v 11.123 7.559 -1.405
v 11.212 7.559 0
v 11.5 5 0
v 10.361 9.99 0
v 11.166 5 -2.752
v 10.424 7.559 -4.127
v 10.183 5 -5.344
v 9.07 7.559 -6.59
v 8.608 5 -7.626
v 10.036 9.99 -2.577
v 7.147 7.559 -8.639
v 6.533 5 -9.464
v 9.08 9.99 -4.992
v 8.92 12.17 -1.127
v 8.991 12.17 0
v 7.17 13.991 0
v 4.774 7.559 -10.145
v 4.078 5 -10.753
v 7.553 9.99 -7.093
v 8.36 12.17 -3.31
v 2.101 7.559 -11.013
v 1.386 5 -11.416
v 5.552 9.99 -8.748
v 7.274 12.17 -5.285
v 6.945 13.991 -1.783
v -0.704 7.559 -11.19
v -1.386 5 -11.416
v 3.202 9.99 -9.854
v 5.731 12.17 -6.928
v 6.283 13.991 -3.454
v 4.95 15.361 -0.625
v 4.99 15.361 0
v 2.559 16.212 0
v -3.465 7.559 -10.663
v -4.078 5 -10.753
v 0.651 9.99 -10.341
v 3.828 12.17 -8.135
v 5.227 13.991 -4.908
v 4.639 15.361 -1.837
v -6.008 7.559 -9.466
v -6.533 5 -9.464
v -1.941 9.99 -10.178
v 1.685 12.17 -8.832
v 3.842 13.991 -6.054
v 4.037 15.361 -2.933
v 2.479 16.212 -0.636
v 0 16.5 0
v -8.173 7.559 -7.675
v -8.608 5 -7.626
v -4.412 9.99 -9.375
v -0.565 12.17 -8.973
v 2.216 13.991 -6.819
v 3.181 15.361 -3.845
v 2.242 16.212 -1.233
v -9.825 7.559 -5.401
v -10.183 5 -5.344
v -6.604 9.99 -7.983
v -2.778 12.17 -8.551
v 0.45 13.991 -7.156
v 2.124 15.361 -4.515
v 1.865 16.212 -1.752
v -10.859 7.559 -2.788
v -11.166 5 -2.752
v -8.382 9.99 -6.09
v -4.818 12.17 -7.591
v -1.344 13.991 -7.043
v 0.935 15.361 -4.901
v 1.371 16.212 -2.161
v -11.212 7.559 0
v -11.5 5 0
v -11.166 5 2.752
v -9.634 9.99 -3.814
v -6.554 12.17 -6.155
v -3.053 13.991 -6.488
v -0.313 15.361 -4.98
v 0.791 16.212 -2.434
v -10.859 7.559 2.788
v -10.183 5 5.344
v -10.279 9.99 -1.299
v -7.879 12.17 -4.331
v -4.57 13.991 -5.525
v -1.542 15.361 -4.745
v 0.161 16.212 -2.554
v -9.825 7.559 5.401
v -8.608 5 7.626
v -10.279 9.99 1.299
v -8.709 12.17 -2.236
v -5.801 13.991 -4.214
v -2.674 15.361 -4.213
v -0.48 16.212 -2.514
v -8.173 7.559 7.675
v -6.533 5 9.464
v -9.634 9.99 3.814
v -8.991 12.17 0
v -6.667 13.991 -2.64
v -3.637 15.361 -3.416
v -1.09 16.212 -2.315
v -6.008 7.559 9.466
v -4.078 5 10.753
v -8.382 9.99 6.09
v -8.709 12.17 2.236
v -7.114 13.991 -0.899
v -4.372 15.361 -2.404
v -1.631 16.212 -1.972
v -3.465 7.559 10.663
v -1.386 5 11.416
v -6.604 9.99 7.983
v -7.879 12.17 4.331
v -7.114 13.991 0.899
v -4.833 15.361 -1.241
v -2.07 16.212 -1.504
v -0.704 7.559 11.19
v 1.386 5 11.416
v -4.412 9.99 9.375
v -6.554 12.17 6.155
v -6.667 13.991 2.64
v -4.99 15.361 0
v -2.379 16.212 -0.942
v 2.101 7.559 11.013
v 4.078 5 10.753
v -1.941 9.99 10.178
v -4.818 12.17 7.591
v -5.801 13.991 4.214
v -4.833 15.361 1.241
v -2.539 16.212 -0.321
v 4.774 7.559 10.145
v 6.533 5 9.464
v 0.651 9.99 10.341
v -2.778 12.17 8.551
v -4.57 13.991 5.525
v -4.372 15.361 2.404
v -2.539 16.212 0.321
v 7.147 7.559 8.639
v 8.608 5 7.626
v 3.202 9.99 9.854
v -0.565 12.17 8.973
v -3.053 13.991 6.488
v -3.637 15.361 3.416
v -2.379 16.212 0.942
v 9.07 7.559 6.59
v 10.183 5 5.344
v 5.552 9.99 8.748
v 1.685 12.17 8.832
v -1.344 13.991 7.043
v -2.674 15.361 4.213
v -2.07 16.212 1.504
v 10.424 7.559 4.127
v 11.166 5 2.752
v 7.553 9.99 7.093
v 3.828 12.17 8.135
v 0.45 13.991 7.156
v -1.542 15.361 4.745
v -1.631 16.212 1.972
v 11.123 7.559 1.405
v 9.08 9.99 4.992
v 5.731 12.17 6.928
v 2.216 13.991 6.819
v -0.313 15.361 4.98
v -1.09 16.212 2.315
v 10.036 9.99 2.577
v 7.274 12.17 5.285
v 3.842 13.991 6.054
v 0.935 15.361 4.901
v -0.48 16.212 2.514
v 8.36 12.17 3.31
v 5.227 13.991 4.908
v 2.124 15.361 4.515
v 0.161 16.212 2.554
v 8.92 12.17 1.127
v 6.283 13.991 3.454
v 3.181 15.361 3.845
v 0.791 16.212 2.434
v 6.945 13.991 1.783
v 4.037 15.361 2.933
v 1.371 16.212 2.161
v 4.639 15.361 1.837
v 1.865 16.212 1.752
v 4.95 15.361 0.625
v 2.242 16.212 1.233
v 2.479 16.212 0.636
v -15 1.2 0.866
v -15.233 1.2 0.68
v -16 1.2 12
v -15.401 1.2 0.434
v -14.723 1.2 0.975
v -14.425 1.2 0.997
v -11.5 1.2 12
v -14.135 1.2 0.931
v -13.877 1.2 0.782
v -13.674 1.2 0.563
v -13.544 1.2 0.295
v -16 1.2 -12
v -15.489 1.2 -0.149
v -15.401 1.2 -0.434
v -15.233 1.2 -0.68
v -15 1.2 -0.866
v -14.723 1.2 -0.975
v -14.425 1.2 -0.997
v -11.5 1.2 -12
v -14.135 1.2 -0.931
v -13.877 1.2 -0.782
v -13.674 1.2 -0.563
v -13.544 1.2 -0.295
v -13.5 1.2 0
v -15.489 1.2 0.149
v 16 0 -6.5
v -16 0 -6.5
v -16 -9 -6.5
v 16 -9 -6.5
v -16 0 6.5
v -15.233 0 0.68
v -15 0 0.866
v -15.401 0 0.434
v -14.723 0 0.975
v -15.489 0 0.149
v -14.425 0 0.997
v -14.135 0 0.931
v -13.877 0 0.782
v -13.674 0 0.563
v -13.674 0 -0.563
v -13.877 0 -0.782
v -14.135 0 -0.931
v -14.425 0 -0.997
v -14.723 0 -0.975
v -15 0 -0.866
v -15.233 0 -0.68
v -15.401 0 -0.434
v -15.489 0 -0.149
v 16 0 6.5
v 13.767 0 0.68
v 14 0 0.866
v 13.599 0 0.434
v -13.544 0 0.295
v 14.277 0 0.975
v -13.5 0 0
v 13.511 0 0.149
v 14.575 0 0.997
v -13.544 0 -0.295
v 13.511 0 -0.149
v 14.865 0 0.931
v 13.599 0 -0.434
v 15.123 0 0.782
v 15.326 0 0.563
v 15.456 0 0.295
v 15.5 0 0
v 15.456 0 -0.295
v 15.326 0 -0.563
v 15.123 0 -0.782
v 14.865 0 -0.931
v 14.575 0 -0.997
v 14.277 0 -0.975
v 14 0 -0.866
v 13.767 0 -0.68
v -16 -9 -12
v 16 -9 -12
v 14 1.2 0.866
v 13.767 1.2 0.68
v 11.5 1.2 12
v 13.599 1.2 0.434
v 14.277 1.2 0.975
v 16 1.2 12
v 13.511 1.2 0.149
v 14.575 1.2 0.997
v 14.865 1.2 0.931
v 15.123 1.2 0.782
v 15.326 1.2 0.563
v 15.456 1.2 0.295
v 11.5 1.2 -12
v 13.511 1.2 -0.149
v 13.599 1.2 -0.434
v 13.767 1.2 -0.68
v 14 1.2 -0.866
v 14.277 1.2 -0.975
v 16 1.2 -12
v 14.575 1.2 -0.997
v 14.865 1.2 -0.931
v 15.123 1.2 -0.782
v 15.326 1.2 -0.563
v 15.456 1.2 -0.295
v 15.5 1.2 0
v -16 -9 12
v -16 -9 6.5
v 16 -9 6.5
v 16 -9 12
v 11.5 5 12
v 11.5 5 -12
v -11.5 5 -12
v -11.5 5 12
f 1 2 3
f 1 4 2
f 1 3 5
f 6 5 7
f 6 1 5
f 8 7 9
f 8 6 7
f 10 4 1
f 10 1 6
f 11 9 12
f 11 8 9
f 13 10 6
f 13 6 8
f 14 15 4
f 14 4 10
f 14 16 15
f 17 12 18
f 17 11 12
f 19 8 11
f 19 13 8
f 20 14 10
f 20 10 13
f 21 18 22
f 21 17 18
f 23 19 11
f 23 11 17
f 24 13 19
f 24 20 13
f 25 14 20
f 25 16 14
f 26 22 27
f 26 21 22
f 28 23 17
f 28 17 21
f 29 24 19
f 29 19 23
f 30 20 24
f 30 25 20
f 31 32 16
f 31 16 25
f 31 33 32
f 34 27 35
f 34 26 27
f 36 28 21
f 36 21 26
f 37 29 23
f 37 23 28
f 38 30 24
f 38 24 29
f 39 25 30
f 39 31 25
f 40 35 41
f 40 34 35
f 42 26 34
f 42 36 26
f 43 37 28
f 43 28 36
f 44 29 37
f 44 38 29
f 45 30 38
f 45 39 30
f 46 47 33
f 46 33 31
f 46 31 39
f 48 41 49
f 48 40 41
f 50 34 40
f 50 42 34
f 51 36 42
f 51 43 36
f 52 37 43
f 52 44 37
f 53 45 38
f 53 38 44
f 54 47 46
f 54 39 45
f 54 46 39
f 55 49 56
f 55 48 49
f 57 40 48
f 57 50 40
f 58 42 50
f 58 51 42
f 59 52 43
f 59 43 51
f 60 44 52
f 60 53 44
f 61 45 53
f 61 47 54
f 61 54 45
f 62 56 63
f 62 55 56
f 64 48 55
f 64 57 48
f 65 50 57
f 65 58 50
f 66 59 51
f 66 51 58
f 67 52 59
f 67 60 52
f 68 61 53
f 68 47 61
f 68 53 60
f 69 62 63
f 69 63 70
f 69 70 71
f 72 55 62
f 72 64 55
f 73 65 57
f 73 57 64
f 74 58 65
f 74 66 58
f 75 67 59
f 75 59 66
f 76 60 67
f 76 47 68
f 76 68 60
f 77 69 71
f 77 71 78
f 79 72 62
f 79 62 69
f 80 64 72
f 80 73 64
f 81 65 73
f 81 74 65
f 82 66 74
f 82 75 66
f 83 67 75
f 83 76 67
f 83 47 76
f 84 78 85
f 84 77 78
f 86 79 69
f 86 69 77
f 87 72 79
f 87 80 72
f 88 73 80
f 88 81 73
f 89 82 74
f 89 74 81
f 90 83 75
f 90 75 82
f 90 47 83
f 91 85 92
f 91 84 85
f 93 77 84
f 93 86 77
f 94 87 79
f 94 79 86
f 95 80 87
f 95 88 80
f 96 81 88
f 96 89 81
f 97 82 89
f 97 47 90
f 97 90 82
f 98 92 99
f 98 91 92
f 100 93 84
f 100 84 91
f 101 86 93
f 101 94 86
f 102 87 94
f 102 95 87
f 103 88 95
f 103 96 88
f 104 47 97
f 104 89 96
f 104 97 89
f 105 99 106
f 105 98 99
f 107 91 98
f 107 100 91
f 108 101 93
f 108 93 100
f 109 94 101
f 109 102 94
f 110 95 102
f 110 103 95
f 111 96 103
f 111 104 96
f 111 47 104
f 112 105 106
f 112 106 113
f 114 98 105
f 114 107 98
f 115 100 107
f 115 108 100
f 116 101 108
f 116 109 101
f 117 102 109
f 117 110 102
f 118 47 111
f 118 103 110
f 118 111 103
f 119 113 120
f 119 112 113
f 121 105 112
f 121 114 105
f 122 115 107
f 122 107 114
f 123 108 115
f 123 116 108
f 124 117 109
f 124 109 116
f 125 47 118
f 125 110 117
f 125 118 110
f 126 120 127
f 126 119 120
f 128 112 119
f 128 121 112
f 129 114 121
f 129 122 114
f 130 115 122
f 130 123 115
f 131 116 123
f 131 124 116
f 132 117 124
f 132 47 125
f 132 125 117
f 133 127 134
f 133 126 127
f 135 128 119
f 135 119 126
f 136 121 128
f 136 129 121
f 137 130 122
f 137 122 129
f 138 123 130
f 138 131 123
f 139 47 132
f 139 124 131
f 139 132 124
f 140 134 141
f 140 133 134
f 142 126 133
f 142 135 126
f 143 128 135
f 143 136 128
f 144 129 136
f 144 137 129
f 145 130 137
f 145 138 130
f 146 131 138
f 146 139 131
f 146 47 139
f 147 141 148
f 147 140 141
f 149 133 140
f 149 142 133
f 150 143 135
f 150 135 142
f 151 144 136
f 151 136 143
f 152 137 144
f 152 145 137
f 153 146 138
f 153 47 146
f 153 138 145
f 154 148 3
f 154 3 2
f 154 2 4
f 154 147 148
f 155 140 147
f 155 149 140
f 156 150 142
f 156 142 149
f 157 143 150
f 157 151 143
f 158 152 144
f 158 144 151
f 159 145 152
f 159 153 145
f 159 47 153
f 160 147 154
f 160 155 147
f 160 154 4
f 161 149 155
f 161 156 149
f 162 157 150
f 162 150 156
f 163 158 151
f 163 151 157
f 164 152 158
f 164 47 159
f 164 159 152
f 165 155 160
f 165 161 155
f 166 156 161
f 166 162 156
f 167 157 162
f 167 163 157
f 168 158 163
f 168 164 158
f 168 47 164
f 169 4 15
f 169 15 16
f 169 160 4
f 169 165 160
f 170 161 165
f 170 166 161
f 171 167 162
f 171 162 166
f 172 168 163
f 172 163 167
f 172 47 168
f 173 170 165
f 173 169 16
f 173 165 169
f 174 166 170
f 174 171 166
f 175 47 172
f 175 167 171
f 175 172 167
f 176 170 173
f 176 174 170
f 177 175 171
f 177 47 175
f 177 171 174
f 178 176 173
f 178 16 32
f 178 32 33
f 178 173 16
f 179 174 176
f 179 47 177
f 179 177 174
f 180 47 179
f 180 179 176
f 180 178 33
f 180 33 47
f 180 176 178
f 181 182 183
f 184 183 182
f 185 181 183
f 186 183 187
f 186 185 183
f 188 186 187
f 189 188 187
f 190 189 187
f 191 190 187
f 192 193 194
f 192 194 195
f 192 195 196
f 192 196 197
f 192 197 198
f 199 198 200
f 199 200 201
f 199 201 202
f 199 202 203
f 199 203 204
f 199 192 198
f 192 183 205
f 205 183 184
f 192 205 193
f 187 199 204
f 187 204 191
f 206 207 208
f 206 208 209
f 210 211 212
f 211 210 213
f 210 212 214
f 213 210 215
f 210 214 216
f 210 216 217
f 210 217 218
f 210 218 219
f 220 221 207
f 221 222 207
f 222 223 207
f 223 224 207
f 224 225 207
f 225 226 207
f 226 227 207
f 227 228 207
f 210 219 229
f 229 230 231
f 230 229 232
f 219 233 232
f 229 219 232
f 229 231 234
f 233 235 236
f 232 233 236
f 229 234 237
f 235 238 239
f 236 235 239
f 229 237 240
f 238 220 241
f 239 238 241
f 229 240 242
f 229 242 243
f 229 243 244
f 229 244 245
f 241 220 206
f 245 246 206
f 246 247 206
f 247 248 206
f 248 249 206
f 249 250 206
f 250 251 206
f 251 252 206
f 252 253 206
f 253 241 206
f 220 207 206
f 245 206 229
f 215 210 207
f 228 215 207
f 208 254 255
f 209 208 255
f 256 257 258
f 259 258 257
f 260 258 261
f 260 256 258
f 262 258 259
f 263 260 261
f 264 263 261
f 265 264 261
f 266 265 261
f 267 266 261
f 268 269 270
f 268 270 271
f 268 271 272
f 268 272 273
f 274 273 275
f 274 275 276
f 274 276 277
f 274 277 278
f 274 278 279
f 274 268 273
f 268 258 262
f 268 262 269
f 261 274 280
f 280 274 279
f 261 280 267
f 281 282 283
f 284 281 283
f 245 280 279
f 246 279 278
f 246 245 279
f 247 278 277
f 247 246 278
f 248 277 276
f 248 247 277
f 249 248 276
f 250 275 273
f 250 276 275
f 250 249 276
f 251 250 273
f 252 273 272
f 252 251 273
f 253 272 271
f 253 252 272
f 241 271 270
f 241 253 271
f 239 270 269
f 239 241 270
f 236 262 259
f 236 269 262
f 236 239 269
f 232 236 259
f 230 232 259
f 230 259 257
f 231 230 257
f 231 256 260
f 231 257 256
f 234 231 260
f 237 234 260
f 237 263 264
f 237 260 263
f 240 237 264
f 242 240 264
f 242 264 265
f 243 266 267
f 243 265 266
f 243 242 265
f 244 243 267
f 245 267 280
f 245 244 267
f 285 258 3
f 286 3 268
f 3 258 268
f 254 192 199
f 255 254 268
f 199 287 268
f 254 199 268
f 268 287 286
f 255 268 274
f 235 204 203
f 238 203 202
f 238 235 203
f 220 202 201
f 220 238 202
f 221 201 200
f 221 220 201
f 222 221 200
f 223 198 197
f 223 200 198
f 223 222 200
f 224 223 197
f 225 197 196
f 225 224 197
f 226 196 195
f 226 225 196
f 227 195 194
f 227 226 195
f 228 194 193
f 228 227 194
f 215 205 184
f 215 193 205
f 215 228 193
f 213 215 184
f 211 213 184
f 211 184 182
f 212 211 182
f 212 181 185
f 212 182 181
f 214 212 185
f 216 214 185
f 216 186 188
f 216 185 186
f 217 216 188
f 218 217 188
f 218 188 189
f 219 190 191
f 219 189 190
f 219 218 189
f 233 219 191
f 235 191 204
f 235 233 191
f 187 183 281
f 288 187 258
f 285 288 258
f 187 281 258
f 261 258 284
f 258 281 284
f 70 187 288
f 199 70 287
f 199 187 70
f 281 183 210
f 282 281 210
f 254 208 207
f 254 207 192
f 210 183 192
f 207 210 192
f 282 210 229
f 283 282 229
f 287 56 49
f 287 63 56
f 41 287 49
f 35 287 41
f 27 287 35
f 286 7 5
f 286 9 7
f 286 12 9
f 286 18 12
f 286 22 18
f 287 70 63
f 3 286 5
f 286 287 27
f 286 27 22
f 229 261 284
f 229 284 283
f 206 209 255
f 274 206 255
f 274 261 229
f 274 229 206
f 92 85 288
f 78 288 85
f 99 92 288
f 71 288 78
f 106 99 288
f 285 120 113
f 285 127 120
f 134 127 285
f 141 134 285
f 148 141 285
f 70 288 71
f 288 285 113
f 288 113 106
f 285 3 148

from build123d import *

# Parameters (mm, degrees)
SKETCH_1_W          = 32
SKETCH_1_H          = 24
EXTRUDE_1_DEPTH     = 1.2
SKETCH_2_W          = 23
SKETCH_2_H          = 24
EXTRUDE_2_DEPTH     = 5
SKETCH_6_W          = 32
SKETCH_6_H          = 5.5
EXTRUDE_5_DEPTH     = 9
SKETCH_8_R          = 1
CUT_EXTRUDE_7_DEPTH = 10


with BuildPart() as part:
    # 草图1 → 凸台-拉伸1 (new body)
    with BuildSketch(Plane(origin=(0, 0, 0), x_dir=(1, 0, 0), z_dir=(0, 1, 0))):
        Rectangle(SKETCH_1_W, SKETCH_1_H)
    extrude(amount=EXTRUDE_1_DEPTH)

    # 草图2 → 凸台-拉伸2 (add)
    with BuildSketch(Plane(origin=(0, 0, 0), x_dir=(1, 0, 0), z_dir=(0, 1, 0))):
        Rectangle(SKETCH_2_W, SKETCH_2_H)
    extrude(amount=EXTRUDE_2_DEPTH)

    # 草图5 → 旋转5 (revolve)
    with BuildSketch(Plane.XY):
        with BuildLine():
            Line((0, 5), (11.5, 5))
            ThreePointArc((11.5, 5), (8.131727984, 13.131727984), (0, 16.5))
            Line((0, 16.5), (0, 5))
        make_face()
    revolve(axis=Axis((0, 5, 0), (0, 1, 0)))

    # 草图6 → 凸台-拉伸5 (add)
    with BuildSketch(Plane(origin=(0, 0, 0), x_dir=(1, 0, 0), z_dir=(0, 1, 0))):
        with Locations((0, 9.25)):
            Rectangle(SKETCH_6_W, SKETCH_6_H)
        with Locations((0, -9.25)):
            Rectangle(SKETCH_6_W, SKETCH_6_H)
    extrude(amount=-EXTRUDE_5_DEPTH)

    # 草图8 → 切除-拉伸7 (cut)
    with BuildSketch(Plane(origin=(0, 0, 0), x_dir=(1, 0, 0), z_dir=(0, 1, 0))):
        with Locations((14.5, 0)):
            Circle(SKETCH_8_R)
        with Locations((-14.5, 0)):
            Circle(SKETCH_8_R)
    extrude(amount=CUT_EXTRUDE_7_DEPTH, mode=Mode.SUBTRACT)


solid = part.part
